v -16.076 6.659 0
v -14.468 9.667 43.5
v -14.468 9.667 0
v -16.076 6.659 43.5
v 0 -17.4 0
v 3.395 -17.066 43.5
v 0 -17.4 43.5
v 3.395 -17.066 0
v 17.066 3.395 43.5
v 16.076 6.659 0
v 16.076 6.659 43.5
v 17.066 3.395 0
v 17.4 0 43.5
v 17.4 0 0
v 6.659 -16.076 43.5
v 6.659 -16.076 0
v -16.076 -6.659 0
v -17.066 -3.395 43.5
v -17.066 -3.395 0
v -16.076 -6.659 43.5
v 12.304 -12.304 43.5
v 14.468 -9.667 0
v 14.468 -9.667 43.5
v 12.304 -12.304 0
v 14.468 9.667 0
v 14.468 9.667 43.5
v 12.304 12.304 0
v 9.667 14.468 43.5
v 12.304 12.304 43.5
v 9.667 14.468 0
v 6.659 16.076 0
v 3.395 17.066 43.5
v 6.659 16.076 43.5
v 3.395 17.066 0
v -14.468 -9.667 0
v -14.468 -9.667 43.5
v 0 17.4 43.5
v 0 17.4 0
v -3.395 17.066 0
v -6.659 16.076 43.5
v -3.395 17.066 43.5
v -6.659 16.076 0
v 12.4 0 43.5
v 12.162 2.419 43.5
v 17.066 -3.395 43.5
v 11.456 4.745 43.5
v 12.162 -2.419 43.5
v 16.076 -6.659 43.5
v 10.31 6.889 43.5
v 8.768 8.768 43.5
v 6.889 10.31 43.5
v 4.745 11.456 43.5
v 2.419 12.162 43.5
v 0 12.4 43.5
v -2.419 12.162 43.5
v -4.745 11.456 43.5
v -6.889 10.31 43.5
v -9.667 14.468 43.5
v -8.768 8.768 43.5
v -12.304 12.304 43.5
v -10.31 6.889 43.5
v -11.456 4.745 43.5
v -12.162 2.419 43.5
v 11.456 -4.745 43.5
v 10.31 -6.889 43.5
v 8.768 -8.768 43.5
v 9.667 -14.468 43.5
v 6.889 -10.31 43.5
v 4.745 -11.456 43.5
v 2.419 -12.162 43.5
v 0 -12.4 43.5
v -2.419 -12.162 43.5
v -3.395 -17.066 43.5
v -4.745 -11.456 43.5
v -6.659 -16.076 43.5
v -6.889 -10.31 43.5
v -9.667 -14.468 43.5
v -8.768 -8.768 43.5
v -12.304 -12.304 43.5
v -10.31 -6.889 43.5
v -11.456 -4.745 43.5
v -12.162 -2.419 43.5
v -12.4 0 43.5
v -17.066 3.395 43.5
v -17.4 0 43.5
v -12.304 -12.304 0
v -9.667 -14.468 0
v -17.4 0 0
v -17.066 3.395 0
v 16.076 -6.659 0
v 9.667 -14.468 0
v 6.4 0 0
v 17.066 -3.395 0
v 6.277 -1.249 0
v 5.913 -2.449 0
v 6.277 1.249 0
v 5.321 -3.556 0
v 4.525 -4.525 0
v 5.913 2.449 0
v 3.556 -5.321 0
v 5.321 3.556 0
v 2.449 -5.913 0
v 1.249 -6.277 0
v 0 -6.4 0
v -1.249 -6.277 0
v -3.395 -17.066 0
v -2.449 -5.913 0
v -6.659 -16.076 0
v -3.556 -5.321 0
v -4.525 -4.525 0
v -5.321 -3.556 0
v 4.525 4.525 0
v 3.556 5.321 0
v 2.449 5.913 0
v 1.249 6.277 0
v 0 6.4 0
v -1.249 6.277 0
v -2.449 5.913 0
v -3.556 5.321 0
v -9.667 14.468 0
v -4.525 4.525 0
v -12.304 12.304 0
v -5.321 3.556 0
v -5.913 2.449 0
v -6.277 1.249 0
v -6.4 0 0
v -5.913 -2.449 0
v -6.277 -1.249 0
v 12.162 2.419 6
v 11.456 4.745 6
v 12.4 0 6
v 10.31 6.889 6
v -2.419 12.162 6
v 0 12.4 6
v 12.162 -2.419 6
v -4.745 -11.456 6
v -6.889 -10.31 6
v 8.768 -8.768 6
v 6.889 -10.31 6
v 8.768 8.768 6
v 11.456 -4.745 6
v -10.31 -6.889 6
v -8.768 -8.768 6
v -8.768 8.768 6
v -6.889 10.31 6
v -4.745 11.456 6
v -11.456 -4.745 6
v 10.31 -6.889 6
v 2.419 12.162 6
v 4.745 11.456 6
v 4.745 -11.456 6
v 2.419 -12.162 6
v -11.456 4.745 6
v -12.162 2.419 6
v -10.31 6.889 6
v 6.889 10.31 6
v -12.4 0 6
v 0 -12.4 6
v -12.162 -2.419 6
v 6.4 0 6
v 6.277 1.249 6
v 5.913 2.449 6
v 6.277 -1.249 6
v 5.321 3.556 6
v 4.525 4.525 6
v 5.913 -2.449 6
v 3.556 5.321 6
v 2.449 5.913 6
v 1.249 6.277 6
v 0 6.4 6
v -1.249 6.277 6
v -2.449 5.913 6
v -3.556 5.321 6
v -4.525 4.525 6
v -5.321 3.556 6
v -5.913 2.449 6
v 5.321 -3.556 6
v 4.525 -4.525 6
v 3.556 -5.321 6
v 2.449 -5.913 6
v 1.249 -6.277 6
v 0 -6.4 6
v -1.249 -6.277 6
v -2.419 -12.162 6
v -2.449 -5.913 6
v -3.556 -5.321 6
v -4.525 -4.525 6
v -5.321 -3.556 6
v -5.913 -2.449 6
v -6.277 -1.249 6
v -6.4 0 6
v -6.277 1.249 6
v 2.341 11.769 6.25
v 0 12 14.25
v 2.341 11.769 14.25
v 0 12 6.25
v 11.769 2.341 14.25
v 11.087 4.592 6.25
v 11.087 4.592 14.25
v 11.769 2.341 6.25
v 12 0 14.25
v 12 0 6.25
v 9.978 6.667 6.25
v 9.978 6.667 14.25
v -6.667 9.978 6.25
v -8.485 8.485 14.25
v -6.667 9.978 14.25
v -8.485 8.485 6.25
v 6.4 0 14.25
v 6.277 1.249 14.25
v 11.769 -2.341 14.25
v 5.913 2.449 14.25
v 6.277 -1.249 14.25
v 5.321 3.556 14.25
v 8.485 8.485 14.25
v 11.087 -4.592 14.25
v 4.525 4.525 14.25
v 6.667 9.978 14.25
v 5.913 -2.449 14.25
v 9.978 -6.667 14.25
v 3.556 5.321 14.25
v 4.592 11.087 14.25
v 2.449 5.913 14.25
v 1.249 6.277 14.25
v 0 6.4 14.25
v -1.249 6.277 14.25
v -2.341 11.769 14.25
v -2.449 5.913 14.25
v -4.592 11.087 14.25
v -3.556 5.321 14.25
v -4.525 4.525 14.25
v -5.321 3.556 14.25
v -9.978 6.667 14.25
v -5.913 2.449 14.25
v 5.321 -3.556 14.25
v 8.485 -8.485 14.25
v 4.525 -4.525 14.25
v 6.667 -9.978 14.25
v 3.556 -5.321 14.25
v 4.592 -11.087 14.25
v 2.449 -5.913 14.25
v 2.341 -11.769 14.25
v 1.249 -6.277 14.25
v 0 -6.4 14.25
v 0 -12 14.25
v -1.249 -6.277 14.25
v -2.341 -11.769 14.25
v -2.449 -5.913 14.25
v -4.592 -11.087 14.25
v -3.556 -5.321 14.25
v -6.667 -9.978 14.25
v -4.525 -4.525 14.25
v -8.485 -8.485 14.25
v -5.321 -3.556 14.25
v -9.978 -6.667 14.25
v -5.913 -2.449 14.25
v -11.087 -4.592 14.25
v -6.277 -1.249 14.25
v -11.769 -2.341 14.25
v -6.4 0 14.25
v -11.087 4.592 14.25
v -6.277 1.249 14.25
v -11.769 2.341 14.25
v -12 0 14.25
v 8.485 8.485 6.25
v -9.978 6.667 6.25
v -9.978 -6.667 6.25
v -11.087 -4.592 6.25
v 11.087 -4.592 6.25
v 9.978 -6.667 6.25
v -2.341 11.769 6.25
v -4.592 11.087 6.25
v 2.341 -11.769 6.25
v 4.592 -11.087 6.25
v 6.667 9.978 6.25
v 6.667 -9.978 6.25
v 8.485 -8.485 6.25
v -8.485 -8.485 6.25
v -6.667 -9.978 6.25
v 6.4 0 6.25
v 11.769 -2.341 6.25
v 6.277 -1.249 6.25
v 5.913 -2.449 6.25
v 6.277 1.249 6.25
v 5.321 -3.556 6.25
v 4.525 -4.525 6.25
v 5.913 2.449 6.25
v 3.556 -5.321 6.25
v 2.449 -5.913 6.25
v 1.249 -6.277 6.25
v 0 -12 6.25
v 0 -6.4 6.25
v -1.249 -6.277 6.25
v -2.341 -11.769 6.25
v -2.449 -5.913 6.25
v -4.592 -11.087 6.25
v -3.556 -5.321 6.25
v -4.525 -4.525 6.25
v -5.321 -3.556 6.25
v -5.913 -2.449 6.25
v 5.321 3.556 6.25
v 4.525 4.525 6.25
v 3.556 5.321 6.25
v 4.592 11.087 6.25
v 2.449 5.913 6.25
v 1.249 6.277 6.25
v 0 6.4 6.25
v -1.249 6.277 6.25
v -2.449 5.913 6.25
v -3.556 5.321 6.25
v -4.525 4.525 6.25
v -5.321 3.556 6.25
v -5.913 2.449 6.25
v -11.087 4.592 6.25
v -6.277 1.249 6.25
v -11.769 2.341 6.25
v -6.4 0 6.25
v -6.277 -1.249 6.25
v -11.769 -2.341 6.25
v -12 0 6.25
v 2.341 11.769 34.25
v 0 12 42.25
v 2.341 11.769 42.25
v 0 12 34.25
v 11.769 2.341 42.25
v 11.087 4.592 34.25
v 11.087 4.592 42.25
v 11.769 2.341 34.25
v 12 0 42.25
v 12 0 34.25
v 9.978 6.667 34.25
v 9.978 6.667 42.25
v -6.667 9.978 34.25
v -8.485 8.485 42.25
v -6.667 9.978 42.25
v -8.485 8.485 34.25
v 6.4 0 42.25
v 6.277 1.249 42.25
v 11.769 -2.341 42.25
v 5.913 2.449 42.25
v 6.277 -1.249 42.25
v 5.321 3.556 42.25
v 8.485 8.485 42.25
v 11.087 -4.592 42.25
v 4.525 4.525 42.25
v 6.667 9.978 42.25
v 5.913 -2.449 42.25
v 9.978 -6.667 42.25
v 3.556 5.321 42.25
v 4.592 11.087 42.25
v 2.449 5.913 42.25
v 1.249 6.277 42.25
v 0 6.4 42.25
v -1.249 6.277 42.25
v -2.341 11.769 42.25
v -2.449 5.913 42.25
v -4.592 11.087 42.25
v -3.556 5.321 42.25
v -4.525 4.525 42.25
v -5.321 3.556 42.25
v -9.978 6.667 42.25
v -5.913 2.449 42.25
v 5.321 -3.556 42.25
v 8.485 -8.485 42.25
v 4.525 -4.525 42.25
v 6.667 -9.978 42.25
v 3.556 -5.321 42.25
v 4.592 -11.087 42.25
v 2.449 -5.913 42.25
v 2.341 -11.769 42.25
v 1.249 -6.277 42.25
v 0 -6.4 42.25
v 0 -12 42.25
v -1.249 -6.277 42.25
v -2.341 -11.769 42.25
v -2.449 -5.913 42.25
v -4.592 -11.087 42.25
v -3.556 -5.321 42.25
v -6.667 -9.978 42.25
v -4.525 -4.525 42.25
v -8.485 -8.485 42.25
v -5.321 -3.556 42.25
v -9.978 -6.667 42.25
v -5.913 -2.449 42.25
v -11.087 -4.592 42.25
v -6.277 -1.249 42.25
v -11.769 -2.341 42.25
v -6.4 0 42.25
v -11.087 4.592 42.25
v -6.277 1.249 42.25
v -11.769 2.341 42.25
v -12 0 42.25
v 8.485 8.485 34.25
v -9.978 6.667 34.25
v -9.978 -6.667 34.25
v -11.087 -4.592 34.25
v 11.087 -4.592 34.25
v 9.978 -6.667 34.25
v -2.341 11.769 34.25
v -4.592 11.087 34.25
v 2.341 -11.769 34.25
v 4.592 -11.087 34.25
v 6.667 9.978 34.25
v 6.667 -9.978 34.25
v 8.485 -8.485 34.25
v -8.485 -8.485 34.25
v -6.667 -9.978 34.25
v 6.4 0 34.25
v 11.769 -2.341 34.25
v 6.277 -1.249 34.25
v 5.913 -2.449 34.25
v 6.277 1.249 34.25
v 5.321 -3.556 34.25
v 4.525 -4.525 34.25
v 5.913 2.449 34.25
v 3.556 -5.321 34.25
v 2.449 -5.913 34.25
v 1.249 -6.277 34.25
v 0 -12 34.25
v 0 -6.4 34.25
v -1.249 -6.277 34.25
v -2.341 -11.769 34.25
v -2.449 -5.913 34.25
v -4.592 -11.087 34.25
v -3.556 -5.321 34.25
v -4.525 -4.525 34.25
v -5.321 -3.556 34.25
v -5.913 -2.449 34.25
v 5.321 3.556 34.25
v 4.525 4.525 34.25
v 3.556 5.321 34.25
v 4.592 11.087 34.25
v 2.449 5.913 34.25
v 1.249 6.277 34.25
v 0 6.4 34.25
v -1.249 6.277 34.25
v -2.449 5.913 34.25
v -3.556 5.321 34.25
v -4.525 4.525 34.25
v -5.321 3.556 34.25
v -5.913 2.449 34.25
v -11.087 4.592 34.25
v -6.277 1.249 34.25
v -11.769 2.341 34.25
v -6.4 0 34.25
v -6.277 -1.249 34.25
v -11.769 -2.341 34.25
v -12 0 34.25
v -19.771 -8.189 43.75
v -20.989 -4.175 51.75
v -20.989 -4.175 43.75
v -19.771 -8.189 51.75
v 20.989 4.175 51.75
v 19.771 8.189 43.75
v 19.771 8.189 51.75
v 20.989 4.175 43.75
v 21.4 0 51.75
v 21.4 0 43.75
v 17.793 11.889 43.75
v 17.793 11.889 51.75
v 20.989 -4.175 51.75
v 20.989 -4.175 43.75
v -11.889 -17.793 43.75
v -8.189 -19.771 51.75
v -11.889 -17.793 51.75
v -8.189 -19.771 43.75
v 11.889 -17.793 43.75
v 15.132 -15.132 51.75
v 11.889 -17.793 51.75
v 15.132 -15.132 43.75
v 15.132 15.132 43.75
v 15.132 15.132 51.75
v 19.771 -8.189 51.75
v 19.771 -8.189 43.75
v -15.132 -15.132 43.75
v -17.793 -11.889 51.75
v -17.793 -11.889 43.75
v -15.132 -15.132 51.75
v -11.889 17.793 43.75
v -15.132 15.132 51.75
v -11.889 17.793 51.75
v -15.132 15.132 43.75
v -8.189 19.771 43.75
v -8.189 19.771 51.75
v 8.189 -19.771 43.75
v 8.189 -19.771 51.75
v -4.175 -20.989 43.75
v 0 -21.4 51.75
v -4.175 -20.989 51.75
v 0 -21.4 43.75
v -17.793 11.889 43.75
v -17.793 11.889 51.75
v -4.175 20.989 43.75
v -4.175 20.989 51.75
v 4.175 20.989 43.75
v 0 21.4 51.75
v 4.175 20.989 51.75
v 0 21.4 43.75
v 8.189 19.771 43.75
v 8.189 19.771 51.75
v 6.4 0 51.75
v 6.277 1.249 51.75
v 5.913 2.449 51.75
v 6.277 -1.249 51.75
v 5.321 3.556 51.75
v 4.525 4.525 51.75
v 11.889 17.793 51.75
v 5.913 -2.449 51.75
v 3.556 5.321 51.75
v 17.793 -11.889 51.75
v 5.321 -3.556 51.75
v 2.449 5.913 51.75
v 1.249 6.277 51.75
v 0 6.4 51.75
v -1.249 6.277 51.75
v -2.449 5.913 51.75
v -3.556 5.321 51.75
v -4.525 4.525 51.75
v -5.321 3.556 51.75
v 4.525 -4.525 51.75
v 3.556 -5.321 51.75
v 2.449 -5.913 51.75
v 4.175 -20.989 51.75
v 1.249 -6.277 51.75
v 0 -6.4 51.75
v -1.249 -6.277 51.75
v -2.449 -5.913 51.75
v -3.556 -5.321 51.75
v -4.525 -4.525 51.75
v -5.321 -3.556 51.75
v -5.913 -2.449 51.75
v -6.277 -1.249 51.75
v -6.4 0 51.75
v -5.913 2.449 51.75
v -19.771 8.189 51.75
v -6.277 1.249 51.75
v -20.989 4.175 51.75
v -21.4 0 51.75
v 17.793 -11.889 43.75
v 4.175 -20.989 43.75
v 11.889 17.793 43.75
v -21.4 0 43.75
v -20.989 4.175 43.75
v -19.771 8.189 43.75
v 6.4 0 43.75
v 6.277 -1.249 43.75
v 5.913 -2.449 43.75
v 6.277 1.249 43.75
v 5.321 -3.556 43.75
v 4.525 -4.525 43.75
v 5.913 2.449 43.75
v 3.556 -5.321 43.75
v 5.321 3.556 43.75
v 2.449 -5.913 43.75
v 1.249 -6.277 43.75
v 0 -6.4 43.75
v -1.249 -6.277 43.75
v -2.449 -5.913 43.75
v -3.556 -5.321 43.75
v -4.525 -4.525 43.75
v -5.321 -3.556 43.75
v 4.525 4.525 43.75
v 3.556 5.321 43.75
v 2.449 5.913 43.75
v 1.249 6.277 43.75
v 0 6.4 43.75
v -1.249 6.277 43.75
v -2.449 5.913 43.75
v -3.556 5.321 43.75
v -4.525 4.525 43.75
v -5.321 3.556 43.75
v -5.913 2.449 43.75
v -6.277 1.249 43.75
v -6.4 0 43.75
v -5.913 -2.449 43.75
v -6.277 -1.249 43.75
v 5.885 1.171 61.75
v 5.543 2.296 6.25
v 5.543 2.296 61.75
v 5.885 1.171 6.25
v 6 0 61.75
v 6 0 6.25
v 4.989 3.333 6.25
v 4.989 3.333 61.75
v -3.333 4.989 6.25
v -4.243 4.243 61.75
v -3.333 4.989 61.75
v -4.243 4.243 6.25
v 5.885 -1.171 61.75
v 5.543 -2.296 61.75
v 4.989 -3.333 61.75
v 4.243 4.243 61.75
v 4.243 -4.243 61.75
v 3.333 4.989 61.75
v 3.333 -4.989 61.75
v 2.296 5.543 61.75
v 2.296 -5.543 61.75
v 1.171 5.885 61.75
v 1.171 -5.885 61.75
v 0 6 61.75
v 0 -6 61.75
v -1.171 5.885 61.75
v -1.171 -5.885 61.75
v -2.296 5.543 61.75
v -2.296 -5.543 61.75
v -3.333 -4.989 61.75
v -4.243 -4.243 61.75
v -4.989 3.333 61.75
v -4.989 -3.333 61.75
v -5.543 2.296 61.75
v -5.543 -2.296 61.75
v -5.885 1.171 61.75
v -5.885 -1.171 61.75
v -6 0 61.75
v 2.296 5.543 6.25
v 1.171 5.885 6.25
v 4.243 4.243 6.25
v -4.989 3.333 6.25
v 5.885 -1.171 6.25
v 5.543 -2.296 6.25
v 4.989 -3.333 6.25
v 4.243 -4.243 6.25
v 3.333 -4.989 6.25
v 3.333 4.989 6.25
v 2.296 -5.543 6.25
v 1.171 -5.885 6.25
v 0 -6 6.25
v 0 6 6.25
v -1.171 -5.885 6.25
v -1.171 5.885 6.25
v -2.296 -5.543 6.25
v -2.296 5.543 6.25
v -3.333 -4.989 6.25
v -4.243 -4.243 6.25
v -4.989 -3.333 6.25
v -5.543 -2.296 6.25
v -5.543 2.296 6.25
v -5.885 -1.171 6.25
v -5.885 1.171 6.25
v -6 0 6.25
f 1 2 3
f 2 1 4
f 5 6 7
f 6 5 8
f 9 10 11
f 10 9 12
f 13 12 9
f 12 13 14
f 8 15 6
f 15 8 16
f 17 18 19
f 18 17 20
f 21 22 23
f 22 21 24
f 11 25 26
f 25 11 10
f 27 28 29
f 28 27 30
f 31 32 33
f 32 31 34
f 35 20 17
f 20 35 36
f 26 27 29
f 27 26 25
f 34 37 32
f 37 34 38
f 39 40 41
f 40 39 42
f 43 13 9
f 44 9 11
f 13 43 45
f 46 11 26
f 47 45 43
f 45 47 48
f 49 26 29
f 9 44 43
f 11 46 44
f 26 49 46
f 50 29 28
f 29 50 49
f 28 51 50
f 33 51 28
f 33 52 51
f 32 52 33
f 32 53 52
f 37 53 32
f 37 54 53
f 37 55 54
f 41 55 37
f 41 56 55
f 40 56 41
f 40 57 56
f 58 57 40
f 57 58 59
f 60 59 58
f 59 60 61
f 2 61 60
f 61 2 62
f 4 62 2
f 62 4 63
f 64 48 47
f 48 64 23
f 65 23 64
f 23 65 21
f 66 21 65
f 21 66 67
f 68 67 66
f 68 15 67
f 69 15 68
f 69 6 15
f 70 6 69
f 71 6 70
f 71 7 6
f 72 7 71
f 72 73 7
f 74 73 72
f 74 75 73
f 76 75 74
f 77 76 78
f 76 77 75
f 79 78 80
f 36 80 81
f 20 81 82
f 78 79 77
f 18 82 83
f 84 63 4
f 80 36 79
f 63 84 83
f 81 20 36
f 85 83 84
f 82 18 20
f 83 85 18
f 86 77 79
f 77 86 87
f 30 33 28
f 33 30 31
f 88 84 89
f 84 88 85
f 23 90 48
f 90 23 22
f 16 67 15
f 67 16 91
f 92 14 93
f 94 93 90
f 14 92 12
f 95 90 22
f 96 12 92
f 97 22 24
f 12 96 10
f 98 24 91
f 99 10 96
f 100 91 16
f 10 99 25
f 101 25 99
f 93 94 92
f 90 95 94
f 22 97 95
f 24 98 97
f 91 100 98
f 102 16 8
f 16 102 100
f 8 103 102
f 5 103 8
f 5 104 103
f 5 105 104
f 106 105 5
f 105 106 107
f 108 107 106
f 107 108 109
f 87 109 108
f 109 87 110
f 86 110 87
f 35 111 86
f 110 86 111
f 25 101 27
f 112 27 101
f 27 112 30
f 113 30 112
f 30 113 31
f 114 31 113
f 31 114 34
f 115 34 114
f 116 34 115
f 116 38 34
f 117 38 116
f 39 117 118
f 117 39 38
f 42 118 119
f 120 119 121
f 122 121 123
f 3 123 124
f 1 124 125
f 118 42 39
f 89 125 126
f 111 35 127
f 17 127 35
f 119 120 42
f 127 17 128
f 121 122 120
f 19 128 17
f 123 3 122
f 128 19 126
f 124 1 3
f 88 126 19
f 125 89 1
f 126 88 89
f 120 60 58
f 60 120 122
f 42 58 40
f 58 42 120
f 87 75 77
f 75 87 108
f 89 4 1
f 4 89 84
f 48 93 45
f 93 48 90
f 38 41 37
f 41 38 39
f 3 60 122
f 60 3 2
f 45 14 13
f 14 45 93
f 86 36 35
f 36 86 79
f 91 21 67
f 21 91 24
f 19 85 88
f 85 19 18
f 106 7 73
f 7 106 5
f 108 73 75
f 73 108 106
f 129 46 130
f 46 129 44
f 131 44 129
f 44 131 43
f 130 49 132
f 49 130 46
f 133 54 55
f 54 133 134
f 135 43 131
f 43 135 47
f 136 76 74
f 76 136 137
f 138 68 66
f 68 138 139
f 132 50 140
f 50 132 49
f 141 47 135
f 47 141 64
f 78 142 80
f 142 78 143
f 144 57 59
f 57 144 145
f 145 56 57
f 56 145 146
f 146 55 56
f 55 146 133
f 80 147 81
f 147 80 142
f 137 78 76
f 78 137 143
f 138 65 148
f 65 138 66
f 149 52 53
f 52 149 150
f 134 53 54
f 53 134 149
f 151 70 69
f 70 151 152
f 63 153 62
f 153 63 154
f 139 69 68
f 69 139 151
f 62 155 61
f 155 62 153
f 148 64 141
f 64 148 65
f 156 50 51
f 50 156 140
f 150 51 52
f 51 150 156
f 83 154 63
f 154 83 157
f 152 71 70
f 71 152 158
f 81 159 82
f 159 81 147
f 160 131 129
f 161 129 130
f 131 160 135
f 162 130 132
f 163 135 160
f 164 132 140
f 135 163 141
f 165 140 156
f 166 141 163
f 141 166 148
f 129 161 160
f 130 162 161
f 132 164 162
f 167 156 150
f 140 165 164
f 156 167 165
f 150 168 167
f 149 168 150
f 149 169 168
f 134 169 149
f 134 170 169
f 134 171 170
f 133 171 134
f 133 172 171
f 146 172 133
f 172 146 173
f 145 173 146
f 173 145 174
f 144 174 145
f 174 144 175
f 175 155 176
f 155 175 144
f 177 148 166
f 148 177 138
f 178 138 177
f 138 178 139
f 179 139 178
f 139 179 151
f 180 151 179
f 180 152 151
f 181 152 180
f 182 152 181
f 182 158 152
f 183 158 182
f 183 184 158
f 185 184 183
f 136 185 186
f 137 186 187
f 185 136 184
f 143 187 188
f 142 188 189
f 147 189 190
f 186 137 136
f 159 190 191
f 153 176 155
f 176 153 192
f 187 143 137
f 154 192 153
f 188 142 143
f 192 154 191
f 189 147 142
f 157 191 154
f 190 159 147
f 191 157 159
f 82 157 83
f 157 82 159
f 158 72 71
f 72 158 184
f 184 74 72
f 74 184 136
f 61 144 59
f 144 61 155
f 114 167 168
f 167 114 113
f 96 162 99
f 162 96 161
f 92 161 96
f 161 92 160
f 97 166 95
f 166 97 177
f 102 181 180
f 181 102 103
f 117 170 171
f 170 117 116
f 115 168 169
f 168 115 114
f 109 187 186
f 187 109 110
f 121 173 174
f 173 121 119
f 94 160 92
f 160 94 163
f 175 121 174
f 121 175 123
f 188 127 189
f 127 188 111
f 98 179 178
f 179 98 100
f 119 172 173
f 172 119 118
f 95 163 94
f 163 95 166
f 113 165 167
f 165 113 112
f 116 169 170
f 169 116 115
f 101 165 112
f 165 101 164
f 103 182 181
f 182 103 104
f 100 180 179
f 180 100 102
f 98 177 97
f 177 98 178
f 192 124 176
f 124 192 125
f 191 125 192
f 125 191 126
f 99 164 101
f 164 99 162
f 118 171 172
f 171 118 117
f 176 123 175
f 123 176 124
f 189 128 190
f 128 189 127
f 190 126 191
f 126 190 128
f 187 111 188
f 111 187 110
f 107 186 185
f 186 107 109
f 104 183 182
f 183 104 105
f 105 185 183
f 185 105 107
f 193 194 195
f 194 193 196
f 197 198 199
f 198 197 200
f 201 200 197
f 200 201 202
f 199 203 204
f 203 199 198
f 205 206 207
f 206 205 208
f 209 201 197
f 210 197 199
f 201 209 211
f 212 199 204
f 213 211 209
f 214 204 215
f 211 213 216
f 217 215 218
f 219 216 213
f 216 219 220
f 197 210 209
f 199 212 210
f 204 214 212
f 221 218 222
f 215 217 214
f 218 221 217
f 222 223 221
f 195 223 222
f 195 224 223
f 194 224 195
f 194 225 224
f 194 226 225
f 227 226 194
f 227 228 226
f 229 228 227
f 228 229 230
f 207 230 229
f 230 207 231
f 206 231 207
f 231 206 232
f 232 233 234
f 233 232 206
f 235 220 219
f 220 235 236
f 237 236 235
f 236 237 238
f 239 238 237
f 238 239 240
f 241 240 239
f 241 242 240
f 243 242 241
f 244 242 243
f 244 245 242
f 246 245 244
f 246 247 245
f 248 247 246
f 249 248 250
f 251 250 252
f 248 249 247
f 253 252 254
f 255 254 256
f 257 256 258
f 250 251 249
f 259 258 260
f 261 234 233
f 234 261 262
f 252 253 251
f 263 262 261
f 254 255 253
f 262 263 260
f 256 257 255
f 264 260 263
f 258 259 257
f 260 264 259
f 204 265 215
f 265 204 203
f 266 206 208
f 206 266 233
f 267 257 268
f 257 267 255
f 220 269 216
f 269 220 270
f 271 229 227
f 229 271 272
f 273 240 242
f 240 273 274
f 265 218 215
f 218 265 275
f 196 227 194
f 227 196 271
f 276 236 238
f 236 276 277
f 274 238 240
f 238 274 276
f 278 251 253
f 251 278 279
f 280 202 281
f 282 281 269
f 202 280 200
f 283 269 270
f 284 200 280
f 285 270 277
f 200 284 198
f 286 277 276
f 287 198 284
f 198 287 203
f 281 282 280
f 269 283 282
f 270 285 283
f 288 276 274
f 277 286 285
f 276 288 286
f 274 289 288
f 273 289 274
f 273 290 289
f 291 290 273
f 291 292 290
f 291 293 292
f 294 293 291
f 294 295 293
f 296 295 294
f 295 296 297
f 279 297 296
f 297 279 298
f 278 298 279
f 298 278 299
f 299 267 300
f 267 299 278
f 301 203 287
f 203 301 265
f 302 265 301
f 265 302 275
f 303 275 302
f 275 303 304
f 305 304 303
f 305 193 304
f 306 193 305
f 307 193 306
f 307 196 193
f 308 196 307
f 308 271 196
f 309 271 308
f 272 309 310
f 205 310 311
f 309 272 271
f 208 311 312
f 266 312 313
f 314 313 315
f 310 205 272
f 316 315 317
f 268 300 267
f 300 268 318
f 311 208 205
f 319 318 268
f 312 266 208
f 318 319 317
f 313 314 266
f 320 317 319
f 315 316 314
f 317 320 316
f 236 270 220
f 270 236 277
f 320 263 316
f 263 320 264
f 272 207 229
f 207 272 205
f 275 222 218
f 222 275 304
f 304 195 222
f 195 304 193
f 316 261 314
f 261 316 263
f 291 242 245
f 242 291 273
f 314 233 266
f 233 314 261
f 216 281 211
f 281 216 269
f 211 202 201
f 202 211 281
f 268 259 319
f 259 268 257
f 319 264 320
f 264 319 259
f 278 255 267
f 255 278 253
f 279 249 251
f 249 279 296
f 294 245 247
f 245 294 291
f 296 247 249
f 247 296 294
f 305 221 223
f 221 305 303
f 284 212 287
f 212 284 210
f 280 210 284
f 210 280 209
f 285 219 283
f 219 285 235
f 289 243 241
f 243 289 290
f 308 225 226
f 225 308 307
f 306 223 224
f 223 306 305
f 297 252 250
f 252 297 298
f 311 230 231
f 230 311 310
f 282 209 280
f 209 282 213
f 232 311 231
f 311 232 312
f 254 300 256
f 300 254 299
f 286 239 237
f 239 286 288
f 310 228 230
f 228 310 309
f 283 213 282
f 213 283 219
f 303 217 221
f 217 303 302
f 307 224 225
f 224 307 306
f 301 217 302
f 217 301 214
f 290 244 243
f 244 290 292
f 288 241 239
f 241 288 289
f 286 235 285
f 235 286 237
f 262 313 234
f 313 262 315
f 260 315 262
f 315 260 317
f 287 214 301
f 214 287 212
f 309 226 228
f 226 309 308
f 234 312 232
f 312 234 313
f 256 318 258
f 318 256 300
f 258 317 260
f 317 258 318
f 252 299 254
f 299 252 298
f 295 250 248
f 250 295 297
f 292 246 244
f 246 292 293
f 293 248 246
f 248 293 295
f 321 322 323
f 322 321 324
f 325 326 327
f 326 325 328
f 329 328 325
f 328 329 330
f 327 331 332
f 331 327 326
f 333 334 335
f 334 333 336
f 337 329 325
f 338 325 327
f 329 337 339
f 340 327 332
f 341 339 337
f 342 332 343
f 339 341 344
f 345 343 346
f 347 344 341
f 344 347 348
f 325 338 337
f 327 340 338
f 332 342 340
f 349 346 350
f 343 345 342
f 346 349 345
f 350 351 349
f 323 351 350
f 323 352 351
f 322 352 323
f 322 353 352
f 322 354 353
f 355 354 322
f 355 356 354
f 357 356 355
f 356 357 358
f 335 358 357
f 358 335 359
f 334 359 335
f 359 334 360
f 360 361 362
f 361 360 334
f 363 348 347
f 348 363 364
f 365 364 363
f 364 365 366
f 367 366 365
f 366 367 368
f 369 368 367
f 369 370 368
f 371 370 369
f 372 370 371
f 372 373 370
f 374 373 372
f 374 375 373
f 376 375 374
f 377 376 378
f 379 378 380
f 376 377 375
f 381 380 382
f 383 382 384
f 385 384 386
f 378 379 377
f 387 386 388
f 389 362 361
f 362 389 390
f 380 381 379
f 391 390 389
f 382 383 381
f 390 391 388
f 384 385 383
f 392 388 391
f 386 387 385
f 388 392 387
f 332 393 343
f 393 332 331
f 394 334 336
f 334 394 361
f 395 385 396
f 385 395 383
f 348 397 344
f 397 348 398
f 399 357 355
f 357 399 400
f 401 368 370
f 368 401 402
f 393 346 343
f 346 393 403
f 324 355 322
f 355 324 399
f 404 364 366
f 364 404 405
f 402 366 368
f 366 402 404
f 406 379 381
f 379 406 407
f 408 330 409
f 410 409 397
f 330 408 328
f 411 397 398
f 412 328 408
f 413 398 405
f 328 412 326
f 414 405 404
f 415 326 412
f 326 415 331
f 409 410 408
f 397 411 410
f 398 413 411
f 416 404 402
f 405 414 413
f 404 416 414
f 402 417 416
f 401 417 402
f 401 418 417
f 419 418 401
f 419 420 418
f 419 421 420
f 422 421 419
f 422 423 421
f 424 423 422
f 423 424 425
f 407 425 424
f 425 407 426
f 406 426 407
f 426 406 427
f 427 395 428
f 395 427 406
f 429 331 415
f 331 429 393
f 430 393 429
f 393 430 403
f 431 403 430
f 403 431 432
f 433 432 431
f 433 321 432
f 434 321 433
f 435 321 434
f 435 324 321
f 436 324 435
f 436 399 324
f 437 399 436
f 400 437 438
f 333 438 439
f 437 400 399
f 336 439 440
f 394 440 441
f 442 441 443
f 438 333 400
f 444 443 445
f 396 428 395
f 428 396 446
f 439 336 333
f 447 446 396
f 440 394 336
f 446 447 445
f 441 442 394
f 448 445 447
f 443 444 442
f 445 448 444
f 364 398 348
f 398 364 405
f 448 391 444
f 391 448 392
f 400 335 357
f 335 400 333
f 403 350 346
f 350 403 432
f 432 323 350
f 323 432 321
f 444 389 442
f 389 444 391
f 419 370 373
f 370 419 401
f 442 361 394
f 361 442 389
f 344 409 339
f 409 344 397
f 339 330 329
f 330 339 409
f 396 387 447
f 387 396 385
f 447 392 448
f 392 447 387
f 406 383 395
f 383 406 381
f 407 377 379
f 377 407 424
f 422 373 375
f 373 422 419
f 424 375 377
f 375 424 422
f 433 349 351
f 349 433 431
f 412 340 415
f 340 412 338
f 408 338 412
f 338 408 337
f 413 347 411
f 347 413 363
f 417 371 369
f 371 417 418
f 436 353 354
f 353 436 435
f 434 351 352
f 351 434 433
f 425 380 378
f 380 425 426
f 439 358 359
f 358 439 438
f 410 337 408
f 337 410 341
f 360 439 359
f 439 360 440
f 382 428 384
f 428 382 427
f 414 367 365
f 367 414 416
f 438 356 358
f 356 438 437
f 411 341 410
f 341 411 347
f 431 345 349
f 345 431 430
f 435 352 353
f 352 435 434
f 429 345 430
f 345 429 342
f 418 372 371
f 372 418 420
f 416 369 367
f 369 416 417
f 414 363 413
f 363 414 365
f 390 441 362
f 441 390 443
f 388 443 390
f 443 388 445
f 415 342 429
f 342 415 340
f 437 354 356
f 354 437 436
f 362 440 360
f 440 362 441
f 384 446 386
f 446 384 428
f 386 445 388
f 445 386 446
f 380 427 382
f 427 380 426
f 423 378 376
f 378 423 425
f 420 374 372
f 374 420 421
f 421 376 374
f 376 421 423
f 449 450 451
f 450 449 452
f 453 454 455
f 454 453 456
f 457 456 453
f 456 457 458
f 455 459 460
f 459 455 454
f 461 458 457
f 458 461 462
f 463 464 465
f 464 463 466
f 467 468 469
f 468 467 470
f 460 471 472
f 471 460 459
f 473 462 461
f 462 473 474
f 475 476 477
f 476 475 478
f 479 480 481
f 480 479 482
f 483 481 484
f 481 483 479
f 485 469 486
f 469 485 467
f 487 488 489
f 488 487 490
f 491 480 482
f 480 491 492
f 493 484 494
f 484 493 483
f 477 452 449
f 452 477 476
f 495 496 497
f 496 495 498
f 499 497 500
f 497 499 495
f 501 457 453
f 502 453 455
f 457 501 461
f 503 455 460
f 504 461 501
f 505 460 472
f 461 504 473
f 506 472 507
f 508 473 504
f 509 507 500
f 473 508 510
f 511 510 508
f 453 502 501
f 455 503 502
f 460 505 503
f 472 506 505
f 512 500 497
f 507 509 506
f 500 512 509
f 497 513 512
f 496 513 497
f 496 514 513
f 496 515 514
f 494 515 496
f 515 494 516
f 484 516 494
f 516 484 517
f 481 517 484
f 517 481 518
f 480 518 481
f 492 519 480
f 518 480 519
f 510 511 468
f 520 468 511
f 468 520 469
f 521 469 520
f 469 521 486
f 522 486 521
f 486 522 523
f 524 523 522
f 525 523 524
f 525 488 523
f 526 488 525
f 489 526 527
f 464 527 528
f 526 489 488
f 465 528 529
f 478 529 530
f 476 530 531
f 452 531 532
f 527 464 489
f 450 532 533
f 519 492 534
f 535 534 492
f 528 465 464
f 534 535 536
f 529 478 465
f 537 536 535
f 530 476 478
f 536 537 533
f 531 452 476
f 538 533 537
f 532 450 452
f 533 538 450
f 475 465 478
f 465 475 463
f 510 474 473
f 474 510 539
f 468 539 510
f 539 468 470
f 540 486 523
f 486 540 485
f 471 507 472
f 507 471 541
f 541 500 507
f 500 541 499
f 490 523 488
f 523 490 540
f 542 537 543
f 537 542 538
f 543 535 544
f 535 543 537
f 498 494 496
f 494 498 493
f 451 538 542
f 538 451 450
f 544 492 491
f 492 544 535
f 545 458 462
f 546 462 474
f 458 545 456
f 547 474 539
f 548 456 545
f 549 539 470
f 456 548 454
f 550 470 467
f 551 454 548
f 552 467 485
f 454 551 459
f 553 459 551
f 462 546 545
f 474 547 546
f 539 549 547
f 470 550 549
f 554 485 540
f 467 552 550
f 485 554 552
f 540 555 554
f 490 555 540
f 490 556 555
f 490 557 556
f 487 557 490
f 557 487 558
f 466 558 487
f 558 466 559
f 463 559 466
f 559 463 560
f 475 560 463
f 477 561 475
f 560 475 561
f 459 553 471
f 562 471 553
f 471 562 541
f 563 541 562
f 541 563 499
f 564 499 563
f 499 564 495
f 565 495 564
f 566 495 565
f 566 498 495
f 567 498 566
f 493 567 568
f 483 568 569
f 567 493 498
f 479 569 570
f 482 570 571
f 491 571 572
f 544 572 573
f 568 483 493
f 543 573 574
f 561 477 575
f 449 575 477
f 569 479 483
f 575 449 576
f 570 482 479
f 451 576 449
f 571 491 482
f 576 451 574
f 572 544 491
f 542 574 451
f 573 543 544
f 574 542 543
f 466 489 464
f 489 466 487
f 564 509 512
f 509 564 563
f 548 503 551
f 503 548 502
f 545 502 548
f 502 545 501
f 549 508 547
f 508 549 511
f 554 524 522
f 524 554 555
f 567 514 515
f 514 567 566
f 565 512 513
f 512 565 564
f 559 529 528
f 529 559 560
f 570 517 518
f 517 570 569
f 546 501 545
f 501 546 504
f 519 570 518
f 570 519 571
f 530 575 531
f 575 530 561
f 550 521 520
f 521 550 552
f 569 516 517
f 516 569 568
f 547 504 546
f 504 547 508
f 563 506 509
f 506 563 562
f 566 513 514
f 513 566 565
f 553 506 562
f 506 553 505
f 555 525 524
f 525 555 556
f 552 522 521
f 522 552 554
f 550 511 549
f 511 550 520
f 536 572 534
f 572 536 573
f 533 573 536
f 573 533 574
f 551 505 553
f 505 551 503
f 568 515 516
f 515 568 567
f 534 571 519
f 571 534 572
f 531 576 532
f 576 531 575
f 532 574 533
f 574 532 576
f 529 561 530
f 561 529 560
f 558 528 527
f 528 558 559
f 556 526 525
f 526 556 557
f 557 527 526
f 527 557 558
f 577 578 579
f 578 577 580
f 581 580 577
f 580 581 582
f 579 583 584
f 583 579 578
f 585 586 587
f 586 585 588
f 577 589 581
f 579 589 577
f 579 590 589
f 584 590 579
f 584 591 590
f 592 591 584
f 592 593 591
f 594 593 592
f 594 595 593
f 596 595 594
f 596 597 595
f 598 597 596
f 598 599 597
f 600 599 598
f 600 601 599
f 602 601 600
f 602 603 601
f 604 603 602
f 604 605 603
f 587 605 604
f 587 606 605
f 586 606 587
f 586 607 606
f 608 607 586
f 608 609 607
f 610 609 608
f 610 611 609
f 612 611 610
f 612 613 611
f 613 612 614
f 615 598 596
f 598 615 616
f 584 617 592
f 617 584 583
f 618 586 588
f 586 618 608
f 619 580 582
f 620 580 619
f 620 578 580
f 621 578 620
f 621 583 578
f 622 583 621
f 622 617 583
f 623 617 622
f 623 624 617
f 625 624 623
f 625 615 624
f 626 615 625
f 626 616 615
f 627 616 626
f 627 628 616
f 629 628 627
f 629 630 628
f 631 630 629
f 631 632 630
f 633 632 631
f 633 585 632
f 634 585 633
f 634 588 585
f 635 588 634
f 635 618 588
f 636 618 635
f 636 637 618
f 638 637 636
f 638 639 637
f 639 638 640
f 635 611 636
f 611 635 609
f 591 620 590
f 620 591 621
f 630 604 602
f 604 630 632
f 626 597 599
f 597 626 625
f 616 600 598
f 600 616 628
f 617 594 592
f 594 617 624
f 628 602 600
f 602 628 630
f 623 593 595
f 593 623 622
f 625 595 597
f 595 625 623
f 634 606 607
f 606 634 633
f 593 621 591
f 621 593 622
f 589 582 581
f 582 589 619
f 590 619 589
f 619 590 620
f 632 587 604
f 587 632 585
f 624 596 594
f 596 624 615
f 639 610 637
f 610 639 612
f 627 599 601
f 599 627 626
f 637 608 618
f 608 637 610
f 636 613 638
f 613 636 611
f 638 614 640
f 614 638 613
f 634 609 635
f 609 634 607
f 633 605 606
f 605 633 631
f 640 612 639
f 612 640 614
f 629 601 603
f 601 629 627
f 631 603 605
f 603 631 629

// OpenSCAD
$fn = 32;

// ------------------------------------------------------------------------
// Shaft station: cup d34.8 x 43.5 mm, shaft d12
// Every part is its own module, assembly() places every instance.
// ------------------------------------------------------------------------

// --- part 1 ---
module housing_cup() {
  difference() {
    cylinder(h = 43.5, d = 34.8);
    translate([0, 0, 6]) cylinder(h = 38.5, d = 24.8);
    translate([0, 0, -1]) cylinder(h = 8, d = 12.8);
  }
}

// --- part 2 ---
module bearing_lower() {
  difference() {
      translate([0, 0, 0]) cylinder(h = 8, d = 24);
      translate([0, 0, -1]) cylinder(h = 10, d = 12.8);
    }
}

// --- part 3 ---
module bearing_upper() {
  difference() {
      translate([0, 0, 0]) cylinder(h = 8, d = 24);
      translate([0, 0, -1]) cylinder(h = 10, d = 12.8);
    }
}

// --- part 4 ---
module station_shaft() {
  translate([0, 0, -27.75]) cylinder(h = 55.5, d = 12);
}

// --- part 5 ---
module station_cover() {
  difference() {
    cylinder(h = 8, d = 42.8);
    translate([0, 0, -1]) cylinder(h = 10, d = 12.8);
  }
}

// --- assembly ---
module assembly() {
  color([0.80, 0.24, 0.20]) translate([0, 0, 0]) rotate([0, 0, 0]) housing_cup();
  color([0.20, 0.45, 0.75]) translate([0, 0, 6.25]) rotate([0, 0, 0]) bearing_lower();
  color([0.25, 0.62, 0.32]) translate([0, 0, 34.25]) rotate([0, 0, 0]) bearing_upper();
  color([0.92, 0.70, 0.18]) translate([0, 0, 34]) rotate([0, 0, 0]) station_shaft();
  color([0.58, 0.35, 0.70]) translate([0, 0, 43.75]) rotate([0, 0, 0]) station_cover();
}

assembly();
